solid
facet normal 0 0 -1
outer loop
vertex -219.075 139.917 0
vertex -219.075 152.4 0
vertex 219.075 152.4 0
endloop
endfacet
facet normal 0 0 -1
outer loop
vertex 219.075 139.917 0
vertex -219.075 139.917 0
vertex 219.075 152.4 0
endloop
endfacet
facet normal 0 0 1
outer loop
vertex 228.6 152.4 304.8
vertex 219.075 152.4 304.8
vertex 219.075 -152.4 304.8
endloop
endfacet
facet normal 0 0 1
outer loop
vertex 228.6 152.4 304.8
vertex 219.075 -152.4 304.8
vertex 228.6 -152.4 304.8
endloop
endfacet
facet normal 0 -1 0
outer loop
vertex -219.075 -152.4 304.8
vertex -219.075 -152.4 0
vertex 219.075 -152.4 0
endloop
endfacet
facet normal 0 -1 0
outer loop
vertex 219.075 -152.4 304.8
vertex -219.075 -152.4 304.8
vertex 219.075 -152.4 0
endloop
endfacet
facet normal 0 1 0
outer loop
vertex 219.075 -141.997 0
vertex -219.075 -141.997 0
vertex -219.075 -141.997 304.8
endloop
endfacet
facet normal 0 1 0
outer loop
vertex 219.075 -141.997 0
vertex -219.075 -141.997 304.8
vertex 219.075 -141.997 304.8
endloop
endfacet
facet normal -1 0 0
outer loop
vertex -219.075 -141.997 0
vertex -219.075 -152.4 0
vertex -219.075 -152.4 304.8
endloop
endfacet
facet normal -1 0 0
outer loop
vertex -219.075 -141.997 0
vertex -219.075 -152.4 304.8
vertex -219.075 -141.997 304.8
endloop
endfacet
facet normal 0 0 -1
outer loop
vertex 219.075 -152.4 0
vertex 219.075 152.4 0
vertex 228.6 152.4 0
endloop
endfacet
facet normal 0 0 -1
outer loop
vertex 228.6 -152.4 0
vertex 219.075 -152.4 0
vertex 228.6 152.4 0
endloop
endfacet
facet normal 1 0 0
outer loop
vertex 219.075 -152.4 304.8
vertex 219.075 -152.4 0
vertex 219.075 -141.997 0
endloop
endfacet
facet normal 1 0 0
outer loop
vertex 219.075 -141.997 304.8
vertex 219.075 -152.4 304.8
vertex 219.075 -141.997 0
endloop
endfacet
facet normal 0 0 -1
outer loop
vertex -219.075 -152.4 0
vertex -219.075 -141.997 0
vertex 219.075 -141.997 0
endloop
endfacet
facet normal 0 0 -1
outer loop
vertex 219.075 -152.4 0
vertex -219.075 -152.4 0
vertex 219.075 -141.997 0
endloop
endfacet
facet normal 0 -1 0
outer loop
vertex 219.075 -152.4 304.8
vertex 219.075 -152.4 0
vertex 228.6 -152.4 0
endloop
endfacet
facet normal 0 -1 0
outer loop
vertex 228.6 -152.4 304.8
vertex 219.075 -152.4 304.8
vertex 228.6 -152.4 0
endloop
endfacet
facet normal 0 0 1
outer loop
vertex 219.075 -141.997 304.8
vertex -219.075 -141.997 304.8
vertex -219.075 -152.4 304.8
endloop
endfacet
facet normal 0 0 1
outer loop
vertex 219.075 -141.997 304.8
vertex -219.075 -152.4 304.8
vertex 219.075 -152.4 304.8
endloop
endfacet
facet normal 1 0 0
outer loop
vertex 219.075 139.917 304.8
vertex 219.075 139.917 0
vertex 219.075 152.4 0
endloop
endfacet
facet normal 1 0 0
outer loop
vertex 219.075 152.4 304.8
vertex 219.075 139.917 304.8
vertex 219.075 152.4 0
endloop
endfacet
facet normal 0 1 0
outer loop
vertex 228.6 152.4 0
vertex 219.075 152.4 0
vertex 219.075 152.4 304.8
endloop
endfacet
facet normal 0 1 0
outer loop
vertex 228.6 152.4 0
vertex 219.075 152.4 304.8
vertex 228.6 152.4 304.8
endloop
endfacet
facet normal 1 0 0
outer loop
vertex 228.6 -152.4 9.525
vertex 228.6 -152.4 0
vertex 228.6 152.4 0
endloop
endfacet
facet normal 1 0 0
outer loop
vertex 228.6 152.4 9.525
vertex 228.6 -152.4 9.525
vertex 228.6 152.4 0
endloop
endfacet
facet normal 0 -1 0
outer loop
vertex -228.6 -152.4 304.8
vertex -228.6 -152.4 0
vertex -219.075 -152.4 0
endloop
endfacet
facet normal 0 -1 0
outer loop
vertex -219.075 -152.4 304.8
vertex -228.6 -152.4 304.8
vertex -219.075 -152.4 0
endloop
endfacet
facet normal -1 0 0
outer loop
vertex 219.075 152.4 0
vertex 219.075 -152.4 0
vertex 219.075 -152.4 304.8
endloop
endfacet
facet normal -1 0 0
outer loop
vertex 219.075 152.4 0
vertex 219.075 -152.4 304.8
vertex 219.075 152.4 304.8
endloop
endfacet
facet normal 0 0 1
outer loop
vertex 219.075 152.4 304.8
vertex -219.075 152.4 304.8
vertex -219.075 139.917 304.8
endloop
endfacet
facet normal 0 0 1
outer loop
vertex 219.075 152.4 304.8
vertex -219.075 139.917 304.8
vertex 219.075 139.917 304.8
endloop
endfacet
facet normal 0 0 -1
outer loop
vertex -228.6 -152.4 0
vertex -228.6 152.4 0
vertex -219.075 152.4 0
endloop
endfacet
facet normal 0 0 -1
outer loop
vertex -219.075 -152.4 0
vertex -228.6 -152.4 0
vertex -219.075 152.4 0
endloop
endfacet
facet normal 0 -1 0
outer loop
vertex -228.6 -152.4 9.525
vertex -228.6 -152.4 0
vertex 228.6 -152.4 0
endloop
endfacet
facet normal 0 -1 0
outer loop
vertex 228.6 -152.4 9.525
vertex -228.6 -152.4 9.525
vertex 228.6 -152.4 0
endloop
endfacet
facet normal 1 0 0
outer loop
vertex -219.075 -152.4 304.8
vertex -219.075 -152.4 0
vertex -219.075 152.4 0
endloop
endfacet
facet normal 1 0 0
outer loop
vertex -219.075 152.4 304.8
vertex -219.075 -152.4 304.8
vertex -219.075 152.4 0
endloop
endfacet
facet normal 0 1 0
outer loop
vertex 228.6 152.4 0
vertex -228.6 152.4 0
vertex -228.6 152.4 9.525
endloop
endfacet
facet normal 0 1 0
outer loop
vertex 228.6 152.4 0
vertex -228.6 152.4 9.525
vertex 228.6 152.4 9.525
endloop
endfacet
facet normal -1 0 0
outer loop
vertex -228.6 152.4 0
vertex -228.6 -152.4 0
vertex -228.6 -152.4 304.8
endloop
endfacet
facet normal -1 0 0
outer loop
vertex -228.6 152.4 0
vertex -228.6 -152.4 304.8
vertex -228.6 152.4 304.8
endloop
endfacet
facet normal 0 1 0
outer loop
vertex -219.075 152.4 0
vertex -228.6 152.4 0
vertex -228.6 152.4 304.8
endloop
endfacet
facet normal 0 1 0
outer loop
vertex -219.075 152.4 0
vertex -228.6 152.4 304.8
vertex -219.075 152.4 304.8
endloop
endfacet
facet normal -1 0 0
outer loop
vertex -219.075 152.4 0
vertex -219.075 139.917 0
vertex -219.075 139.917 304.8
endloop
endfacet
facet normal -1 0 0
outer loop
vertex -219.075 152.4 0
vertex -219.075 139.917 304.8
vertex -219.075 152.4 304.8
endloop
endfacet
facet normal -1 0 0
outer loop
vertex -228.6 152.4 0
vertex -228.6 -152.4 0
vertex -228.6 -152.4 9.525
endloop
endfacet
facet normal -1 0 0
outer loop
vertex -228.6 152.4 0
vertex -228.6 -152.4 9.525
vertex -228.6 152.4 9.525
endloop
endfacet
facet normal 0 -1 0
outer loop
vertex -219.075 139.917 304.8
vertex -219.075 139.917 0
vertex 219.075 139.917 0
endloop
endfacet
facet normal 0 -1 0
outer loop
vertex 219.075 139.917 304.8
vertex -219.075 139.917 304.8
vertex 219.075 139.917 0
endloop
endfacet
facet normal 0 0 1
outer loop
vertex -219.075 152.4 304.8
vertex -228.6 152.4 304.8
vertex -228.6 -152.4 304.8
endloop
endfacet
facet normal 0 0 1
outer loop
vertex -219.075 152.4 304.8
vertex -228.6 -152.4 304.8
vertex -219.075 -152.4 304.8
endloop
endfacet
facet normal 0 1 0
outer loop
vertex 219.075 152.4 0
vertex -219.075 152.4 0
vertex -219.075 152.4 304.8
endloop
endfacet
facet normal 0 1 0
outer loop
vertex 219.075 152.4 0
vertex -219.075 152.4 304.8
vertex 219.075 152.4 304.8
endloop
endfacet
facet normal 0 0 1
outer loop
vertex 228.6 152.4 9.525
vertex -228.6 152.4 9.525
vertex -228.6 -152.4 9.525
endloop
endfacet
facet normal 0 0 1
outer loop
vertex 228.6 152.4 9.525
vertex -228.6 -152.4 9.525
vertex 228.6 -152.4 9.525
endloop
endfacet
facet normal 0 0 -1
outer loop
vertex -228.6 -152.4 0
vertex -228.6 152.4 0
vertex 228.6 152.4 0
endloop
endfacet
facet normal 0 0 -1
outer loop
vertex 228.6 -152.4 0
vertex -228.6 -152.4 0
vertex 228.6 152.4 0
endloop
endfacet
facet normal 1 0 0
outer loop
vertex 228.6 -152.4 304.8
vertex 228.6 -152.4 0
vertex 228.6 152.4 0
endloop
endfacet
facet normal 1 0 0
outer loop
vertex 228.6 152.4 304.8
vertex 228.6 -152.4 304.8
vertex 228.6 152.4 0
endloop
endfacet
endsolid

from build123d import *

# Parameters (mm, degrees)
F0_W     = 438.15
F0_H     = 12.483267
F0_H_2   = 10.402717
F2_DEPTH = 304.8
F1_W     = 9.525
F1_H     = 304.8
F3_DEPTH = 304.8
F4_W     = 457.2
F4_H     = 304.8
F5_DEPTH = 9.525


with BuildPart() as f2:
    # F0 (on Top) → F2 (new body)
    with BuildSketch(Plane.XY):
        with Locations((0, 146.158366)):
            Rectangle(F0_W, F0_H)
        with Locations((0, -147.198642)):
            Rectangle(F0_W, F0_H_2)
    extrude(amount=F2_DEPTH)


with BuildPart() as f3:
    # F1 (on Top) → F3 (new body)
    with BuildSketch(Plane.XY):
        with Locations((-223.8375, 0)):
            Rectangle(F1_W, F1_H)
        with Locations((223.8375, 0)):
            Rectangle(F1_W, F1_H)
    extrude(amount=F3_DEPTH)


with BuildPart() as f5:
    # F4 (on Top) → F5 (new body)
    with BuildSketch(Plane.XY):
        Rectangle(F4_W, F4_H)
    extrude(amount=F5_DEPTH)


solid = Compound([f2.part, f3.part, f5.part])
